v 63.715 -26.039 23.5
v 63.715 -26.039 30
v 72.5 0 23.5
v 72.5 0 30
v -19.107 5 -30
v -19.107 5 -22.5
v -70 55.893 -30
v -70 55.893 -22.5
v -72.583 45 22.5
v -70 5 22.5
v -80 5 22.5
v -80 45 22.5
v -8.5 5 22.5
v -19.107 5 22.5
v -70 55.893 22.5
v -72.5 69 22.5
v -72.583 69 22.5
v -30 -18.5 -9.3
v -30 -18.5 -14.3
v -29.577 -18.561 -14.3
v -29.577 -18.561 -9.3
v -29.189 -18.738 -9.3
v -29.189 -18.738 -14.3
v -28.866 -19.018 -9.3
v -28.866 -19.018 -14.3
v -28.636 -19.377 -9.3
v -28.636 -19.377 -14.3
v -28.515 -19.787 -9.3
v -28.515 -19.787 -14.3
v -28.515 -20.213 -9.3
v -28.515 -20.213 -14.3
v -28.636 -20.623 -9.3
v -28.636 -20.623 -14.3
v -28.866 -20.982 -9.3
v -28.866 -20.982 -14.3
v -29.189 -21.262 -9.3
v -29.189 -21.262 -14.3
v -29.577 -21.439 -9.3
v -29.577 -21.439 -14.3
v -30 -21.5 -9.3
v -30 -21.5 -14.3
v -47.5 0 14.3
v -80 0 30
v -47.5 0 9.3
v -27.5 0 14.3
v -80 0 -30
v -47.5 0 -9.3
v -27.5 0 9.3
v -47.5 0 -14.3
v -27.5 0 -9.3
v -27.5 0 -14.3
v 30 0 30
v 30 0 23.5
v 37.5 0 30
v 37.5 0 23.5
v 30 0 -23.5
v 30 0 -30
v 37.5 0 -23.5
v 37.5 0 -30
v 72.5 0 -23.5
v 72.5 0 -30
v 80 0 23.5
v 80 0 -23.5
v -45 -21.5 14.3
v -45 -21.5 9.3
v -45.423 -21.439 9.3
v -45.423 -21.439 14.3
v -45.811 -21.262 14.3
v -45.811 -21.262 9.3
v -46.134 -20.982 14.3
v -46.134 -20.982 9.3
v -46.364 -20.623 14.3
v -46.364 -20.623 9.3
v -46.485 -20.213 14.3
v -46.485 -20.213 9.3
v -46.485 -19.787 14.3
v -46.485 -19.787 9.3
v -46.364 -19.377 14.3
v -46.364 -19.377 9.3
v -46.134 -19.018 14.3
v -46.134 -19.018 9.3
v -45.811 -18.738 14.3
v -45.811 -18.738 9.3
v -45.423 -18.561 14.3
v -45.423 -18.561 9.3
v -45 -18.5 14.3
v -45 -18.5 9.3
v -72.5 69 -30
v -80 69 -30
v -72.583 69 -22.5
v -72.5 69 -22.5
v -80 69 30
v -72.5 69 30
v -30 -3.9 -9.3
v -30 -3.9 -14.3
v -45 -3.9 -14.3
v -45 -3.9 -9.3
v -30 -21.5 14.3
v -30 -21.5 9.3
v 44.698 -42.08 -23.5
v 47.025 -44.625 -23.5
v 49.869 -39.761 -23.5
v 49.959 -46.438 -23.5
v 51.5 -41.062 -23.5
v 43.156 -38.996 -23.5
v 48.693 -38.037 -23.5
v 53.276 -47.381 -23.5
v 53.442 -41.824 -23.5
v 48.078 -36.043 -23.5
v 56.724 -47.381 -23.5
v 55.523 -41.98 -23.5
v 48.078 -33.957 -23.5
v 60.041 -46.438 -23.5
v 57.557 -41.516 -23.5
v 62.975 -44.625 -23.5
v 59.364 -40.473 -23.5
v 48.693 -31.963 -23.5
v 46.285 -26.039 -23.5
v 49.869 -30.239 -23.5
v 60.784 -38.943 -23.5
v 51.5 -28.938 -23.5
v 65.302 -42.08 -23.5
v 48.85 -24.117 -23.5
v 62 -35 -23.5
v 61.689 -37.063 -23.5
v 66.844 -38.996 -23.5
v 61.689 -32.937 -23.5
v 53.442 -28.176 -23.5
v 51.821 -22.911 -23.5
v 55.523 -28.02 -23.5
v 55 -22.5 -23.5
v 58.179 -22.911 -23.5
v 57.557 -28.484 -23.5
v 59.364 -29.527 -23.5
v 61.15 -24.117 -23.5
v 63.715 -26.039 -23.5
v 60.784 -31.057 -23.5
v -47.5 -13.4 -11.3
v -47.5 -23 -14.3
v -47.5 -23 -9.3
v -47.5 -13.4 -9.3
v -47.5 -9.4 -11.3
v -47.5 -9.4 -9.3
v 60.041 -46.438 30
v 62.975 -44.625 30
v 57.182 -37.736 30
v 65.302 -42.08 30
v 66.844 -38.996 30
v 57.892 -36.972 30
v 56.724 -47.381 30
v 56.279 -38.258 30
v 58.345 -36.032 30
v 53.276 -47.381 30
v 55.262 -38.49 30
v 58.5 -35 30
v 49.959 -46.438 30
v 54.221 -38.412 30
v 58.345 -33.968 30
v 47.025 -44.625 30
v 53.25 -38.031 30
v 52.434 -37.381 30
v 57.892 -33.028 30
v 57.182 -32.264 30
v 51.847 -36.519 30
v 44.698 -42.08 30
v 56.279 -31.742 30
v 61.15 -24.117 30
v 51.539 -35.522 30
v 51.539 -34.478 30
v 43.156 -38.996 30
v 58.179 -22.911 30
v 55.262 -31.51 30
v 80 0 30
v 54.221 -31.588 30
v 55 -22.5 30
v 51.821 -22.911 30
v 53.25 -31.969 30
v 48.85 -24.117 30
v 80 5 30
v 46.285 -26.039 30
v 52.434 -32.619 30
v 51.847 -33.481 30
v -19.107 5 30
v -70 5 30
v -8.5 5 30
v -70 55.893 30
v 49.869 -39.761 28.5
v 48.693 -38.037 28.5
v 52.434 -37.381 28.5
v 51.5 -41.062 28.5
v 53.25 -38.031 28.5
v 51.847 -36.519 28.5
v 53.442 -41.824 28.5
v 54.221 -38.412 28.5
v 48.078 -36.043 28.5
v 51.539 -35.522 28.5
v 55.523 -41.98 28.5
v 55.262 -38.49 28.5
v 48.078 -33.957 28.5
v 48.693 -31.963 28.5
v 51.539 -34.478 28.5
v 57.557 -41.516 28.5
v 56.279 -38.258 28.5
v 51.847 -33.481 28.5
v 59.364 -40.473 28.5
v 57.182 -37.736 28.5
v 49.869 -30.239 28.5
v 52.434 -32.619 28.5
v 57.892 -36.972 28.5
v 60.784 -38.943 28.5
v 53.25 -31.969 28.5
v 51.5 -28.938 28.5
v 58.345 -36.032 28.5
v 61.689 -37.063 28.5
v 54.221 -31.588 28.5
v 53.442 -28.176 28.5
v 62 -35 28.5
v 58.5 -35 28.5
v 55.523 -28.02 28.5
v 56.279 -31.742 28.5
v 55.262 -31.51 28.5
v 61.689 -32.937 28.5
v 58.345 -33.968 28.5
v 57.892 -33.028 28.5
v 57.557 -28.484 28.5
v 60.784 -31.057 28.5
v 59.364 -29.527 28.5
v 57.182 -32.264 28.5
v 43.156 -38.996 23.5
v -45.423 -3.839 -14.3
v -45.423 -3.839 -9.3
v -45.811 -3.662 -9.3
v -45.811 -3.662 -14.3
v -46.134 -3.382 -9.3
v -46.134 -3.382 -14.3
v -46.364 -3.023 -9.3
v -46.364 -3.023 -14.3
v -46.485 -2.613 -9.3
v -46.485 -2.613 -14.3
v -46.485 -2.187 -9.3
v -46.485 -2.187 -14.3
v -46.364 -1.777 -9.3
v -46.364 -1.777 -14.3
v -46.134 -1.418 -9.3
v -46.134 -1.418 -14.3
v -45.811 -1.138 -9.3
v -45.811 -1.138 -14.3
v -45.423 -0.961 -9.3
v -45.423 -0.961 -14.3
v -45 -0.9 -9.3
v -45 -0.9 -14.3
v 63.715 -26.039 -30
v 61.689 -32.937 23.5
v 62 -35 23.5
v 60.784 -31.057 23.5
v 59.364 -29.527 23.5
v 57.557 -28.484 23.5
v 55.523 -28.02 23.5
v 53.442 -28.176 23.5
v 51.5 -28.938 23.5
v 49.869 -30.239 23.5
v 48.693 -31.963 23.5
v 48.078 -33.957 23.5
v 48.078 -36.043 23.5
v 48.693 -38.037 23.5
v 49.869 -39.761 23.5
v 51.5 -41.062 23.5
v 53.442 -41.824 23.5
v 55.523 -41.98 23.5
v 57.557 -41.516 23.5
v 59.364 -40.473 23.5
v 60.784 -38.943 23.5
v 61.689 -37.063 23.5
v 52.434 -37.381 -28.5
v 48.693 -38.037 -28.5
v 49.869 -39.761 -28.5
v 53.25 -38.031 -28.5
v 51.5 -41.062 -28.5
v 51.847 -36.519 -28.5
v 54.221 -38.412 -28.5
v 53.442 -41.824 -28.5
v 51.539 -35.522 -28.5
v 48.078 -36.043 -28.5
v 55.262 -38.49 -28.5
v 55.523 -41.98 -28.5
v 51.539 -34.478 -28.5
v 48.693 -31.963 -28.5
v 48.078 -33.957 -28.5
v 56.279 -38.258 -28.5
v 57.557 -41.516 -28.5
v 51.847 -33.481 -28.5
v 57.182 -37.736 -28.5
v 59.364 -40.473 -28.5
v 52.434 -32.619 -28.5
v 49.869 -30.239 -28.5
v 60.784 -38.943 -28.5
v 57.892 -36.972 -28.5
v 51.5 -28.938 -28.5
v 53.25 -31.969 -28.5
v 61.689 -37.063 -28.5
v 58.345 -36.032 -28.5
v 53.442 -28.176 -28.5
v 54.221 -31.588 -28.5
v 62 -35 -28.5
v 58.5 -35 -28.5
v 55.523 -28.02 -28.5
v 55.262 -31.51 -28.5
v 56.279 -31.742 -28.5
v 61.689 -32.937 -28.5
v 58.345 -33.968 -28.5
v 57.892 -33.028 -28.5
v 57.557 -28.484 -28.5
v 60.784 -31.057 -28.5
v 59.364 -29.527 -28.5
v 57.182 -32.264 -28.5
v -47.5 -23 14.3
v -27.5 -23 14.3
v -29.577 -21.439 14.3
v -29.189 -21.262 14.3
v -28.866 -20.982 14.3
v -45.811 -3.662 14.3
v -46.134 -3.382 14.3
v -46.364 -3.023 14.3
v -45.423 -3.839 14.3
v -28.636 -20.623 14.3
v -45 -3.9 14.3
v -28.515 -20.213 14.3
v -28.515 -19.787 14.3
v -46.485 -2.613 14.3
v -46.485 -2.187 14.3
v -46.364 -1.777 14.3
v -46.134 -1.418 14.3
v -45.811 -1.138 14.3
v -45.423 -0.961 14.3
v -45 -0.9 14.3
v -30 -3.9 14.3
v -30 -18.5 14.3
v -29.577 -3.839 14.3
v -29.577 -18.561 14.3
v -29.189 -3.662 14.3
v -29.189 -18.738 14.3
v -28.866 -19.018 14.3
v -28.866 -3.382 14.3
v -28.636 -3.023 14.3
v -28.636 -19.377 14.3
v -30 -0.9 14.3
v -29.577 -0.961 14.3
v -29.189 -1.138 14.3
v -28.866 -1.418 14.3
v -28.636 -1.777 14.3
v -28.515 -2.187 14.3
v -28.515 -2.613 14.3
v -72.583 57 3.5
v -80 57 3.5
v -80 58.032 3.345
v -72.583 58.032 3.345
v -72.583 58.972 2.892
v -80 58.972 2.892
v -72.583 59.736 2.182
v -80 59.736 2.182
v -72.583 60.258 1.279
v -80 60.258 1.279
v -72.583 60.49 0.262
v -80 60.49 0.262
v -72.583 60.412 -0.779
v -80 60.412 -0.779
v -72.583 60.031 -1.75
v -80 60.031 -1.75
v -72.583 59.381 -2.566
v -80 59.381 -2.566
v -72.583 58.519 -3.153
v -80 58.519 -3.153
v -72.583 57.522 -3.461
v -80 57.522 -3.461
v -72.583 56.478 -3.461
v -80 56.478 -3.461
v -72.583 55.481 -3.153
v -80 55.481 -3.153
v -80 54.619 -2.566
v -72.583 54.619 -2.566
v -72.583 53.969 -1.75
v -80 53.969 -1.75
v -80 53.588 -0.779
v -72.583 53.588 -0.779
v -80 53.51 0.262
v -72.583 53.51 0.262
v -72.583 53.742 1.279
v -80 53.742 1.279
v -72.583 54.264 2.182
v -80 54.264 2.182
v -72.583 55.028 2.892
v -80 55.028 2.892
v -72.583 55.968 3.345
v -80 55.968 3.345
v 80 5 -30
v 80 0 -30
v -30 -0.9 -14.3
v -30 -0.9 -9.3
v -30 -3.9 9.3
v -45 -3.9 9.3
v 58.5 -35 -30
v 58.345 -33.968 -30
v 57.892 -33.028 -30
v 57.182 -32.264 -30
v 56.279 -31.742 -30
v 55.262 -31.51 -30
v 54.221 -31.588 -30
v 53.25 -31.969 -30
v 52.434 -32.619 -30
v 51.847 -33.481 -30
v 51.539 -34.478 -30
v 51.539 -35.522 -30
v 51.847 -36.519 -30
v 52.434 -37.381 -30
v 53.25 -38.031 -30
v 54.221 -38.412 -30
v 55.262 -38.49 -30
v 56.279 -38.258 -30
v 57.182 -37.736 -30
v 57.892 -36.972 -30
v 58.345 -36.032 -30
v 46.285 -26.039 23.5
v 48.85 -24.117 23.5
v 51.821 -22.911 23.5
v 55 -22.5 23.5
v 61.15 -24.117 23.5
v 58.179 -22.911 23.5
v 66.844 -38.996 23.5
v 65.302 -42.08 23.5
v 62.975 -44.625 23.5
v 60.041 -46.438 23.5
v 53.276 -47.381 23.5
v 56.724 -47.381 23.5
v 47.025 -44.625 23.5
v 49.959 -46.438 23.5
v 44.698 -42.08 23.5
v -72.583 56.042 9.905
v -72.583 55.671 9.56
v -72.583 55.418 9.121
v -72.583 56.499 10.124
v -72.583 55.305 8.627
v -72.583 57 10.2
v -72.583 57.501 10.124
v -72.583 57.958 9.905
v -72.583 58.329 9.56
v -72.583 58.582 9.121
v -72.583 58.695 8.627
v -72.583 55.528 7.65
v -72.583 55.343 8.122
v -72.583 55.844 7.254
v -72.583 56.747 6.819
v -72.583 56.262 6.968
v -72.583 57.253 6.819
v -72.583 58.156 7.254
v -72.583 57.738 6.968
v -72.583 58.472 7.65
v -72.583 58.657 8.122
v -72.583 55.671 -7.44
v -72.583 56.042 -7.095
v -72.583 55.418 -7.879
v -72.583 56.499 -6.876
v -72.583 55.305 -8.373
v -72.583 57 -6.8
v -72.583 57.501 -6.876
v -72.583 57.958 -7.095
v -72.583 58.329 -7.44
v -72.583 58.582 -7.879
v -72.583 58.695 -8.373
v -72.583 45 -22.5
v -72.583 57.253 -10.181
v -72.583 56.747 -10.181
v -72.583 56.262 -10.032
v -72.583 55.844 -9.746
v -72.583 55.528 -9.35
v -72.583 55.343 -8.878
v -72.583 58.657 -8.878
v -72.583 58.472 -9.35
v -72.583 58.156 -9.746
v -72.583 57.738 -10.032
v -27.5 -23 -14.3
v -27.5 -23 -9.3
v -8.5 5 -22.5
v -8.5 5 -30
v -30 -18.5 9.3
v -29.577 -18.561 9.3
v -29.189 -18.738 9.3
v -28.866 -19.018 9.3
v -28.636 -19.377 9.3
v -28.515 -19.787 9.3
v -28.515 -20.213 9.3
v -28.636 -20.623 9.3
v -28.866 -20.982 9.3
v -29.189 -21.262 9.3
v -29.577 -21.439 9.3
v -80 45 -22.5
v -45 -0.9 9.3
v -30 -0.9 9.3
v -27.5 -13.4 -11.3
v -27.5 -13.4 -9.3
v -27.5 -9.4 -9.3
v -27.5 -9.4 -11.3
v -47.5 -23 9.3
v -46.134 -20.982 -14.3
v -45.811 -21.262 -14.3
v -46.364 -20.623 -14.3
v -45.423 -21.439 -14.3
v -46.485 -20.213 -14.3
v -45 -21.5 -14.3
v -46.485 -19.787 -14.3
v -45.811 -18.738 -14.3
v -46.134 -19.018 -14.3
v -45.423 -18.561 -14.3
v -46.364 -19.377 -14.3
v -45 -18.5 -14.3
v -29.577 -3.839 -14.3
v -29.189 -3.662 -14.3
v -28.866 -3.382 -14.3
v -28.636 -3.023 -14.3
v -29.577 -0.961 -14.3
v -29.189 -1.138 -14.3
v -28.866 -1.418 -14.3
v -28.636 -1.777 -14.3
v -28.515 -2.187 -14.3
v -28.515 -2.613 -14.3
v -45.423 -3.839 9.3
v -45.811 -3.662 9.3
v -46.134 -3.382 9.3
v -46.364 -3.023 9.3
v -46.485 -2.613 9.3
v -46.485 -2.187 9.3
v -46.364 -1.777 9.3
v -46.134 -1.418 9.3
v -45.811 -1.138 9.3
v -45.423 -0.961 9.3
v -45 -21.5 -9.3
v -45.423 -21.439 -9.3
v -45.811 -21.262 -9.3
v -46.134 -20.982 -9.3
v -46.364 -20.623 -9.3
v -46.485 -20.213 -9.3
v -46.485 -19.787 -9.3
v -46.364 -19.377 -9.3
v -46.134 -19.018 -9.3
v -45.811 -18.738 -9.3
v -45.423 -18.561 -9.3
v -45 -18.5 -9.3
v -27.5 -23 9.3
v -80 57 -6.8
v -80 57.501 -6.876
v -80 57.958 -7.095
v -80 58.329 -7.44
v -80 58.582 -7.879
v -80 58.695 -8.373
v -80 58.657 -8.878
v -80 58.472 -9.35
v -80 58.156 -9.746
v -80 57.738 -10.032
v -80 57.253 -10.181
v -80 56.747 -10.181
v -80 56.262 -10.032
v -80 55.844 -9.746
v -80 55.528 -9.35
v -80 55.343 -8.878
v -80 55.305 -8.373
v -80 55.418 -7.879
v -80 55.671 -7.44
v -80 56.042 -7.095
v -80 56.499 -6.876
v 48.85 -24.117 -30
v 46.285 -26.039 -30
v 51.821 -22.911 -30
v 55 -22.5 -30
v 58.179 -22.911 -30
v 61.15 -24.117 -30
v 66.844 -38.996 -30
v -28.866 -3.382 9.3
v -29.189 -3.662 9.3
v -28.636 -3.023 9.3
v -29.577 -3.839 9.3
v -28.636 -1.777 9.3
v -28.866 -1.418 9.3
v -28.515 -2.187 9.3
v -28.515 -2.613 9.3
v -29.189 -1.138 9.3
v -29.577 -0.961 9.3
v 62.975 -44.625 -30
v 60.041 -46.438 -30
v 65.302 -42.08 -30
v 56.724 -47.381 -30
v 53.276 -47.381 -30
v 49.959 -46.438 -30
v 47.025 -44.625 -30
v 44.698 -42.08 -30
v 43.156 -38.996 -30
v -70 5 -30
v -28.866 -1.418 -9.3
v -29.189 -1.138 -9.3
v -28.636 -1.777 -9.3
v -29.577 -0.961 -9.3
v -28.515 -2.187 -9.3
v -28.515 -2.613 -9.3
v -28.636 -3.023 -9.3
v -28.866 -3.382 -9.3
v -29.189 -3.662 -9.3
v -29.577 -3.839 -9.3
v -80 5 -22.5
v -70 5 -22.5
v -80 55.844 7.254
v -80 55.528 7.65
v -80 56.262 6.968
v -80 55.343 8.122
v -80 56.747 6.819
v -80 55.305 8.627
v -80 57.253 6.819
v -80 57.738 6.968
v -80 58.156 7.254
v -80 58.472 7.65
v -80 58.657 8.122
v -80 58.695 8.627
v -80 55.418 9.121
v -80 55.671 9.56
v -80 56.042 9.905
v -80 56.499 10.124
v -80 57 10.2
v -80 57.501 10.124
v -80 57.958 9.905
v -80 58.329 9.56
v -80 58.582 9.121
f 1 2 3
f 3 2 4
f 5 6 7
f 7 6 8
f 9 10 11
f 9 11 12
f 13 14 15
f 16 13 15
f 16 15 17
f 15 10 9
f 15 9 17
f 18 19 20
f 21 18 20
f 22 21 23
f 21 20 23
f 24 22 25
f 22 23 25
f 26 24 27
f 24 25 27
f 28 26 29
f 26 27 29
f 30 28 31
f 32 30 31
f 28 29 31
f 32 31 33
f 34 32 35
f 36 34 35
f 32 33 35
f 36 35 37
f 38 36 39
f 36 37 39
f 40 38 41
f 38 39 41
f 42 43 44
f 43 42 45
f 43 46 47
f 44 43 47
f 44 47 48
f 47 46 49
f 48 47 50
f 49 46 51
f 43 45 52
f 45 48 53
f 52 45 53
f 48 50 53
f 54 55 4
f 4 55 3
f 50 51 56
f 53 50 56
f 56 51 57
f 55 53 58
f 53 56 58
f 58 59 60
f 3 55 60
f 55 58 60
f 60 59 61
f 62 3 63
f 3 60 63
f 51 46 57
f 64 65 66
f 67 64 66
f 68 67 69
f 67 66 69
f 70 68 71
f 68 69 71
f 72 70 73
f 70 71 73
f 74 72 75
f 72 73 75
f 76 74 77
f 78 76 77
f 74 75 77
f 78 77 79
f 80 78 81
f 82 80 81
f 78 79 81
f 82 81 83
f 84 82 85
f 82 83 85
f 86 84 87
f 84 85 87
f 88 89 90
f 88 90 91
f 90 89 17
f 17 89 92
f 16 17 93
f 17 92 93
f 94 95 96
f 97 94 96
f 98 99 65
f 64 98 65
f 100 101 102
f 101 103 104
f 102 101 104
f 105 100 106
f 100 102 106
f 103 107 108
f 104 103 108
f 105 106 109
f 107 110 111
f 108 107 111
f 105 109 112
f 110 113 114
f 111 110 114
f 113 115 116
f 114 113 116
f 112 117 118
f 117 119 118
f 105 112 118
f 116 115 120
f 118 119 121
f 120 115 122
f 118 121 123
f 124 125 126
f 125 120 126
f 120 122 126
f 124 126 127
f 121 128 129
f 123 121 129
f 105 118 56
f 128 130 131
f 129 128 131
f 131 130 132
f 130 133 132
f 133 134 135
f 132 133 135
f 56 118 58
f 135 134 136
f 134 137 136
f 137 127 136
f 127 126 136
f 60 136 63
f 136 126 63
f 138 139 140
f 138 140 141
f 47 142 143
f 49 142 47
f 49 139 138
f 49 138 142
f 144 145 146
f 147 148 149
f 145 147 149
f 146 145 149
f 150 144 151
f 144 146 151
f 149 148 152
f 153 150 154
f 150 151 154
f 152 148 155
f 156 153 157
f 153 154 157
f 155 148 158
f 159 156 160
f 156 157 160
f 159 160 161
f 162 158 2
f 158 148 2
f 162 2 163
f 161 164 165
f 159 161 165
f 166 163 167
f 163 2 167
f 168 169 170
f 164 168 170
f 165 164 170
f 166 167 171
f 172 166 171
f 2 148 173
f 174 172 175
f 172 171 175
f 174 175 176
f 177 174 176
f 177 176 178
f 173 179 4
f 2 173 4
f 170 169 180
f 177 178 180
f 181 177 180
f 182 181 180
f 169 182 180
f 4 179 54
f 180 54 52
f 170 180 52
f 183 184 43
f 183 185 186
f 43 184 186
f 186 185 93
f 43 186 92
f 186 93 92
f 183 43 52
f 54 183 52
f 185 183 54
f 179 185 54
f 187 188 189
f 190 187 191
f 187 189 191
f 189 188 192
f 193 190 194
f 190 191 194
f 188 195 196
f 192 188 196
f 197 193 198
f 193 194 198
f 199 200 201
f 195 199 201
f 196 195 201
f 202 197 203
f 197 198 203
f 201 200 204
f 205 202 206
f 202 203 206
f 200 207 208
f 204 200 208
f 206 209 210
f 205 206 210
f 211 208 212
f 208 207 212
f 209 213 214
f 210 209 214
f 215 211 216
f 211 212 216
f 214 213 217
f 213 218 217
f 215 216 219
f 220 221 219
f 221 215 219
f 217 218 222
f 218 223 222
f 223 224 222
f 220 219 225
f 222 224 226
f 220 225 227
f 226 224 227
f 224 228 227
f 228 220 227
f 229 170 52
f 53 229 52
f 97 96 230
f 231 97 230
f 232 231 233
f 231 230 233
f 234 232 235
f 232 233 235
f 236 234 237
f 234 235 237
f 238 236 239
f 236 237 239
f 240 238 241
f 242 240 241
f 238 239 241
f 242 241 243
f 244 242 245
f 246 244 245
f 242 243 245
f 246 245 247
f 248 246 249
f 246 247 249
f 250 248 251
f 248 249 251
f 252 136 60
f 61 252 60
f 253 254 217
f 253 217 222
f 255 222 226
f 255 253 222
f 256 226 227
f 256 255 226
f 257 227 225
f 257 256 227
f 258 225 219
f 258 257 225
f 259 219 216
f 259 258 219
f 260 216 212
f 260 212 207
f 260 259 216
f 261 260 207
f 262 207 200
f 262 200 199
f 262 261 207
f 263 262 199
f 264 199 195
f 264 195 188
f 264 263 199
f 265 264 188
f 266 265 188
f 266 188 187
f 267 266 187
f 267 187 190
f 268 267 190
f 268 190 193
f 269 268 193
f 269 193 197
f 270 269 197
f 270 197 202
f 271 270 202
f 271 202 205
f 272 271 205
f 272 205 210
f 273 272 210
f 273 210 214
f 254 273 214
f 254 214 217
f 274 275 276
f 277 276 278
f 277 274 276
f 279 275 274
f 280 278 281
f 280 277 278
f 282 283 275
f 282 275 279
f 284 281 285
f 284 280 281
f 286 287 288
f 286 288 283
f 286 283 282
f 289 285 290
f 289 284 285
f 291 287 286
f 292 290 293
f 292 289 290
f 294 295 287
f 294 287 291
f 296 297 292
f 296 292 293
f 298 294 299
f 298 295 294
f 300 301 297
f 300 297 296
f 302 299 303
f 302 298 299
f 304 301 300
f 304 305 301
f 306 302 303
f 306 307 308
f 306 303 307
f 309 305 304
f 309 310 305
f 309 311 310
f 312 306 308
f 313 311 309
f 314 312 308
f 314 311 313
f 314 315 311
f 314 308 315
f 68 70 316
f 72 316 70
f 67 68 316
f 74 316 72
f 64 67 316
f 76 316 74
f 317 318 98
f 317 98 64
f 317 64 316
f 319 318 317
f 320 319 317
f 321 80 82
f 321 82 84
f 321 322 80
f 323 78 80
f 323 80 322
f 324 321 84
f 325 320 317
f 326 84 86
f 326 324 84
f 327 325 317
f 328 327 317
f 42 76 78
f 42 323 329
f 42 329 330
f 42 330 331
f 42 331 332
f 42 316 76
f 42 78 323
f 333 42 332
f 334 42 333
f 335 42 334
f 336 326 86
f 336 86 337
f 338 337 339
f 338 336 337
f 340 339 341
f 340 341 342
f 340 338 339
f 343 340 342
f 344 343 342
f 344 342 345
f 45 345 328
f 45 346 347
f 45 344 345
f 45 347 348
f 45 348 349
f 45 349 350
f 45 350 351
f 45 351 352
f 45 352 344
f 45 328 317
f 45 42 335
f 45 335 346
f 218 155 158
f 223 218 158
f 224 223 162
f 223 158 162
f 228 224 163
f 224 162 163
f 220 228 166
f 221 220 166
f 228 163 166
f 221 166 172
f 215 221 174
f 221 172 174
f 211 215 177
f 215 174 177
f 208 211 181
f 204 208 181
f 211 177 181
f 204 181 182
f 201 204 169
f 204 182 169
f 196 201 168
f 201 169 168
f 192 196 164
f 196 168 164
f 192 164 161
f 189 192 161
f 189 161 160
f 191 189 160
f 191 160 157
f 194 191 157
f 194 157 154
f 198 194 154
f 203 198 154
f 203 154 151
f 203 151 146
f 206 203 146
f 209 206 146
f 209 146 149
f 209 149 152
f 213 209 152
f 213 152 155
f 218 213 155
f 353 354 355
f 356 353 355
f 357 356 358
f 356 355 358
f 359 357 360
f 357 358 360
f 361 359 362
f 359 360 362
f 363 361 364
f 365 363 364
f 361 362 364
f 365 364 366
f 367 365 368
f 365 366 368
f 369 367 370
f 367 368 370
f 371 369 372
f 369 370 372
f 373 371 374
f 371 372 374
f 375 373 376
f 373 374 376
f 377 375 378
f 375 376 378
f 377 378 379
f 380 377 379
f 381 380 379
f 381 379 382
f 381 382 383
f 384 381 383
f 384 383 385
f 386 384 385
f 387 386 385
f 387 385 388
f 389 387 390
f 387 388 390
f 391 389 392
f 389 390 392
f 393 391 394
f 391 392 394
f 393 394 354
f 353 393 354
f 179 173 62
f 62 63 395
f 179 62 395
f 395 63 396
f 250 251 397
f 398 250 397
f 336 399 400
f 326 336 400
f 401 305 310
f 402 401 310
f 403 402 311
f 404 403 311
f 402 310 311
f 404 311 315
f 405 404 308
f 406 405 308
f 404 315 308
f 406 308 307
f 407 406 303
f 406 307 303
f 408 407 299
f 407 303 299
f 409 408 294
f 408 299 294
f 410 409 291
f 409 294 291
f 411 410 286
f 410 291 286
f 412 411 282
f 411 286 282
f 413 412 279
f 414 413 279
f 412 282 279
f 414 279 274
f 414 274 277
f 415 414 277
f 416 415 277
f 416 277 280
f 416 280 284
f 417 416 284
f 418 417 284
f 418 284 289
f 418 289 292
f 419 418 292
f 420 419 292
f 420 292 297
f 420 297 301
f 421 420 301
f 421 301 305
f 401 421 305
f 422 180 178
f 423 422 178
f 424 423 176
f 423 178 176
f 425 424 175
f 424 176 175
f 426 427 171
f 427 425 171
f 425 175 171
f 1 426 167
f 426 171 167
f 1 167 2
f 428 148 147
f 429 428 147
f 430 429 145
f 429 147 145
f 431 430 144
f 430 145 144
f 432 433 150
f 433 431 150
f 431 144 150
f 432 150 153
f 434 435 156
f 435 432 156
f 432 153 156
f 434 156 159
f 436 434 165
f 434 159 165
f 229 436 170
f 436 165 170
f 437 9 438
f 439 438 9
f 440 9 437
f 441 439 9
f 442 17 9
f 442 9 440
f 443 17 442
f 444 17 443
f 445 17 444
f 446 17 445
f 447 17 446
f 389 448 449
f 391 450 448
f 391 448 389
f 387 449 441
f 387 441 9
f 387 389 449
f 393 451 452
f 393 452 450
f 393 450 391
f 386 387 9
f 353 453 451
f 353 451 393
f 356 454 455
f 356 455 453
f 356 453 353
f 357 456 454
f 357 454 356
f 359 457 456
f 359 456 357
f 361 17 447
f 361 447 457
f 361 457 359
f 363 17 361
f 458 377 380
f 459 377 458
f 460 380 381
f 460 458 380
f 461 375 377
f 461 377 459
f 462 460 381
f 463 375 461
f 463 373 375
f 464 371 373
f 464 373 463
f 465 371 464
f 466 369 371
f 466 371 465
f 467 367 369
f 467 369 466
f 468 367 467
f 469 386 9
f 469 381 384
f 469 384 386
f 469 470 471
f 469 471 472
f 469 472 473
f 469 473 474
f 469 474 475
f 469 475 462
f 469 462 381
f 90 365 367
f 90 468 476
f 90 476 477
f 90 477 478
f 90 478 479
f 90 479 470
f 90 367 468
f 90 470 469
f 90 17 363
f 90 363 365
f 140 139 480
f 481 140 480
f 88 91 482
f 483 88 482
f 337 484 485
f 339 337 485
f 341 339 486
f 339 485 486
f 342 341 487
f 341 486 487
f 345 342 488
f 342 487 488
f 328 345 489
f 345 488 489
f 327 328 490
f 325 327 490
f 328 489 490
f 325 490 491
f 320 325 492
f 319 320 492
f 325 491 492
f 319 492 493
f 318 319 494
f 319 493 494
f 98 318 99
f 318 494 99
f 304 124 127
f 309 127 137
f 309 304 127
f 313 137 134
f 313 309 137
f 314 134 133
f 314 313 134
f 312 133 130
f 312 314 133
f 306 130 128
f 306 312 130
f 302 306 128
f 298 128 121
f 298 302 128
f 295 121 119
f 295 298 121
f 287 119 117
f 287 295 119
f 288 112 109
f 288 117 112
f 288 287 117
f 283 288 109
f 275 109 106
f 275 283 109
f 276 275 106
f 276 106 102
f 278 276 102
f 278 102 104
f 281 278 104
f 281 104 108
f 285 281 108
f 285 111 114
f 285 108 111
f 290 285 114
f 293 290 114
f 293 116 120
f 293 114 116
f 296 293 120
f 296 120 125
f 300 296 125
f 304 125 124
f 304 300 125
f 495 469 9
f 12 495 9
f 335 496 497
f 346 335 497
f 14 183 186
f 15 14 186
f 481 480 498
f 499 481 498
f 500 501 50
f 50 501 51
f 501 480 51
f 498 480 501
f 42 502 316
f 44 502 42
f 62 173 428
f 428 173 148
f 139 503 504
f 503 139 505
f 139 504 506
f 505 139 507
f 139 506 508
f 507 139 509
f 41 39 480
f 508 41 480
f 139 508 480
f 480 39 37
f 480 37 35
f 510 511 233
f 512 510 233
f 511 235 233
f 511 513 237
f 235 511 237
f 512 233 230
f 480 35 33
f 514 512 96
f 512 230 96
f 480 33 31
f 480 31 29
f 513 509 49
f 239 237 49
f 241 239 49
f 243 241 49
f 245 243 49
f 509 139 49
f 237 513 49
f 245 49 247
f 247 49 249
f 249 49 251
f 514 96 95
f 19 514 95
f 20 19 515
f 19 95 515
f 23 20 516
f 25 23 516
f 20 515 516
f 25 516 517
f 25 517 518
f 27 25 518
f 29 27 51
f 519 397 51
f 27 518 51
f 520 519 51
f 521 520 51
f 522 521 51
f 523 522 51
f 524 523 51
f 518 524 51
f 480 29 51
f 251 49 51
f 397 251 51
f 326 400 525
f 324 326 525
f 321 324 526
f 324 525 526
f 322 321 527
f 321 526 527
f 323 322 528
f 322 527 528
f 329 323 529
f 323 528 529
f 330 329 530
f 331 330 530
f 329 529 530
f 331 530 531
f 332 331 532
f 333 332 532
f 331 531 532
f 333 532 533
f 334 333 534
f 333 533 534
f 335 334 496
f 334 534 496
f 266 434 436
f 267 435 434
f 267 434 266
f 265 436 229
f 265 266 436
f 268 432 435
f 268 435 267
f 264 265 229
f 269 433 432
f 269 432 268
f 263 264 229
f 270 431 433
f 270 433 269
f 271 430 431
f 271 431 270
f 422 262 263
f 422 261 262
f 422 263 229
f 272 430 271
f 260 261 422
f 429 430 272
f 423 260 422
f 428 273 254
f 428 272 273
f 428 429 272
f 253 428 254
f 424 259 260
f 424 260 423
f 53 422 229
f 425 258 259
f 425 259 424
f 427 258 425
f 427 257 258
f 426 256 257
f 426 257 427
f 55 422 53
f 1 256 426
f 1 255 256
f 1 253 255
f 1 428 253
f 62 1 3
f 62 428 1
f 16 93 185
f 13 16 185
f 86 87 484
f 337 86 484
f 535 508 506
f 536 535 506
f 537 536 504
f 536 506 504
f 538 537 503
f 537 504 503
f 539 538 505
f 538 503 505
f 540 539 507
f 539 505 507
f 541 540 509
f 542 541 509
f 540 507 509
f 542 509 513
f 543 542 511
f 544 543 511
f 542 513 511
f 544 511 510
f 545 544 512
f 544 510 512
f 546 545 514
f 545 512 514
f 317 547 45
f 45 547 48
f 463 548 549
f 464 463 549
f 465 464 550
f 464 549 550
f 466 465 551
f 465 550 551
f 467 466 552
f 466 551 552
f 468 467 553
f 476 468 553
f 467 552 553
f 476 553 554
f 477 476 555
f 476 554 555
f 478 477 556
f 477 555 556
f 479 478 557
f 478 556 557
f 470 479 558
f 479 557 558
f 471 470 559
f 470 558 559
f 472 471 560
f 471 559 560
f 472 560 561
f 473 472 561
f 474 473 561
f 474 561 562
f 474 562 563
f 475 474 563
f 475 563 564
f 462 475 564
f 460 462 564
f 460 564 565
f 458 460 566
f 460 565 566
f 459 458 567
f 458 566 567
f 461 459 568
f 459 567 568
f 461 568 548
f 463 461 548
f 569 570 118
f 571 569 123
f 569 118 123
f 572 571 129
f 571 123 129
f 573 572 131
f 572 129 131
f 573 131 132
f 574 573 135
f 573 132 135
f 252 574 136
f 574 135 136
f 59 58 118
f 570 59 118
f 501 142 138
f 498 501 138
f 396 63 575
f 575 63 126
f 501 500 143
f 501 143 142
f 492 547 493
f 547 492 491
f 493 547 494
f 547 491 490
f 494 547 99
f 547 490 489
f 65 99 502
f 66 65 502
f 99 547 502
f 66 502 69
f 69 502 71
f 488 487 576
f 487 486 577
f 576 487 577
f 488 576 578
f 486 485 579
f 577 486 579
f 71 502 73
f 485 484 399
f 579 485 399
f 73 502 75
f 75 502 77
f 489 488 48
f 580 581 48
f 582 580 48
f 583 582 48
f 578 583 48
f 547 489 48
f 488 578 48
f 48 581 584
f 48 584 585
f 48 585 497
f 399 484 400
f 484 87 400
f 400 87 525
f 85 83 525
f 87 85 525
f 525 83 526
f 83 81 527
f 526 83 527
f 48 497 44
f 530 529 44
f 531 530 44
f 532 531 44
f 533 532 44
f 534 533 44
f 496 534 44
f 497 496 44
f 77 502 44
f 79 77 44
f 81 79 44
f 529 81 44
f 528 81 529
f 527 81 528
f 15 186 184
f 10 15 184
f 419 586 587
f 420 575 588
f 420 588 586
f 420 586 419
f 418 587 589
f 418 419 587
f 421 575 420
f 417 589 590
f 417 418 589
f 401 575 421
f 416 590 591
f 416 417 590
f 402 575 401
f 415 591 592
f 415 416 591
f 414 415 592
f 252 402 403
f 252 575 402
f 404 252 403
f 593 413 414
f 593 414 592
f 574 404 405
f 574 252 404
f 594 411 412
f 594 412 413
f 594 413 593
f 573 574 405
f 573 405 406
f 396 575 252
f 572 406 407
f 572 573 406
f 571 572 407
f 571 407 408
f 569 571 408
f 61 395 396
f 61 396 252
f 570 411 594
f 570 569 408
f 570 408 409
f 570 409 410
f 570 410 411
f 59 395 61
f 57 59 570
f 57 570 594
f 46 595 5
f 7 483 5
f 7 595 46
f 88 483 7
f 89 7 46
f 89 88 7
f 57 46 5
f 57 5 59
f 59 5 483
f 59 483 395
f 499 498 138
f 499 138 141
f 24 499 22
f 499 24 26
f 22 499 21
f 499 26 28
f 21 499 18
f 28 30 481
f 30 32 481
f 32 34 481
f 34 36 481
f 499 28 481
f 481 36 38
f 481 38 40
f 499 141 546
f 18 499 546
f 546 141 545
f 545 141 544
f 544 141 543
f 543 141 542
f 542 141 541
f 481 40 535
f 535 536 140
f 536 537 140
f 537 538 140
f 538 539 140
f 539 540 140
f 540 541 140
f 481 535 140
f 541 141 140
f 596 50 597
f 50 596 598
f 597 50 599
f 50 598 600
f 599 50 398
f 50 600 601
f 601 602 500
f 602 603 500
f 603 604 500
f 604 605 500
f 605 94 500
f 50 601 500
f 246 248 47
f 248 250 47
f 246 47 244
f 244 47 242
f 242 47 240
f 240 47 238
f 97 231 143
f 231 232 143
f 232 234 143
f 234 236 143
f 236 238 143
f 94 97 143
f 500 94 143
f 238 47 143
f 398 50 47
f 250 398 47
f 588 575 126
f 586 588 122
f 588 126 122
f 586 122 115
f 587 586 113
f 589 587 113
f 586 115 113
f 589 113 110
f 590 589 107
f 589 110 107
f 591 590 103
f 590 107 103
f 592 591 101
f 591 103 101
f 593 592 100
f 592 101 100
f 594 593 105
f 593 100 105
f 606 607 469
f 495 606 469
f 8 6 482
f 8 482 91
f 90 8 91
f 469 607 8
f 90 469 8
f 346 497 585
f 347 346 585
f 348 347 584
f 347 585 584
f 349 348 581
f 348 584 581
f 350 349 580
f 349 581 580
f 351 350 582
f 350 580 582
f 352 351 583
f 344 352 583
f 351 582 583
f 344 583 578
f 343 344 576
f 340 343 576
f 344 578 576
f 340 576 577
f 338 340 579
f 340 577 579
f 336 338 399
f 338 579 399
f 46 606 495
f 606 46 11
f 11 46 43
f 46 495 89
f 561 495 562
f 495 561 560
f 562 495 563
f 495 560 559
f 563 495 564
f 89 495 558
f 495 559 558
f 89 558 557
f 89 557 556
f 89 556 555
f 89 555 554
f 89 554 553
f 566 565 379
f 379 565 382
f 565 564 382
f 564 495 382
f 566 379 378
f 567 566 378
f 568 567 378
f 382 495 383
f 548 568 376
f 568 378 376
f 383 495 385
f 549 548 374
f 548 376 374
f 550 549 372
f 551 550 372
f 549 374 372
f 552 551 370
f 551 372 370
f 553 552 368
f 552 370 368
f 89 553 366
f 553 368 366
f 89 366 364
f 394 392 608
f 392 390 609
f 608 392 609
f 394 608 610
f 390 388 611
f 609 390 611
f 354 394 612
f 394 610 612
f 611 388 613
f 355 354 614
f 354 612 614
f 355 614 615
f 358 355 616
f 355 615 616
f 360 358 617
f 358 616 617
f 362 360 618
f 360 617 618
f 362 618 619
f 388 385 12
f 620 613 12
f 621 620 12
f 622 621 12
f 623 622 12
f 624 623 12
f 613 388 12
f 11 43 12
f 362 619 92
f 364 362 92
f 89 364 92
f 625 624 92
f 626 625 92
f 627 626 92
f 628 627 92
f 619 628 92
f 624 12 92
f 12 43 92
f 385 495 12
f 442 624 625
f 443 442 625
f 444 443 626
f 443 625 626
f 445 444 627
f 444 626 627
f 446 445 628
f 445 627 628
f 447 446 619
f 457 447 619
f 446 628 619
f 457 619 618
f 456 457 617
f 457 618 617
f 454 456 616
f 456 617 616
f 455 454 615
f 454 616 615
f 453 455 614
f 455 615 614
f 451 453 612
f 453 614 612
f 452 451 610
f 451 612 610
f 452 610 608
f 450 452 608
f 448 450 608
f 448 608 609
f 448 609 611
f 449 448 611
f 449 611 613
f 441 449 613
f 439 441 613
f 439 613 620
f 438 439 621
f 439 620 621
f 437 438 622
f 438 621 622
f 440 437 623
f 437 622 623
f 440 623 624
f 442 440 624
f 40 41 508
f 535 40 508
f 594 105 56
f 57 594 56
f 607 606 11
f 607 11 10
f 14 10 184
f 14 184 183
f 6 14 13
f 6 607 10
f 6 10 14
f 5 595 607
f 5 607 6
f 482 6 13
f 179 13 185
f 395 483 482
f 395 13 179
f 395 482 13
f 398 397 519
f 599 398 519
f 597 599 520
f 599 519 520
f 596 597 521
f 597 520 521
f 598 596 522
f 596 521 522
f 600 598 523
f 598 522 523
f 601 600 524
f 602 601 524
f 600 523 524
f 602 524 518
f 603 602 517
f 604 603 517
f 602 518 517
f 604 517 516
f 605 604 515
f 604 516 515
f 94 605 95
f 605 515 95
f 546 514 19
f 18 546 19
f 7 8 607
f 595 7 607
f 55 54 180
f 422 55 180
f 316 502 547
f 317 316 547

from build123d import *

# Parameters (mm, degrees)
SKETCH1_W                = 160
SKETCH1_H                = 60
BOSS_EXTRUDE1_DEPTH      = 5
BOSS_EXTRUDE3_DEPTH      = 14.3
BOSS_EXTRUDE3_DEPTH_BACK = 14.3
SKETCH8_W                = 20
SKETCH8_H                = 23
CUT_EXTRUDE1_REACH       = 134.986
BOSS_EXTRUDE4_DEPTH      = 60
CUT_EXTRUDE2_START       = -71.5
SKETCH11_W               = 45
SKETCH11_H               = 40
CUT_EXTRUDE2_DEPTH       = 71.5
SKETCH12_W               = 24.082620142
SKETCH12_H               = 45
CUT_EXTRUDE3_DEPTH       = 24
SKETCH13_R               = 3.5
SKETCH13_R_2             = 1.7
CUT_EXTRUDE4_DEPTH       = 7.417379858
SKETCH14_R               = 3.5
BOSS_EXTRUDE5_DEPTH      = 60
SKETCH16_W               = 47
SKETCH16_H               = 47.898935067
CUT_EXTRUDE6_DEPTH       = 107.5
CUT_EXTRUDE7_DEPTH       = 28.5
CUT_EXTRUDE7_DEPTH_BACK  = 28.5
SKETCH17_R               = 7


with BuildPart() as part:
    # Sketch1 → Boss-Extrude1 (new body)
    with BuildSketch(Plane(origin=(0, 0, 0), x_dir=(1, 0, 0), z_dir=(0, 1, 0))):
        Rectangle(SKETCH1_W, SKETCH1_H)
    extrude(amount=BOSS_EXTRUDE1_DEPTH)

    # Sketch8 → Boss-Extrude3 (add, two sides: drawn at the far end of the back side and taken through both)
    with BuildSketch(Plane.XY.offset(-BOSS_EXTRUDE3_DEPTH_BACK)):
        with Locations((-37.5, -11.5)):
            Rectangle(SKETCH8_W, SKETCH8_H)
        with BuildLine():
            Line((-45, -18.5), (-30, -18.5))
            ThreePointArc((-30, -18.5), (-28.5, -20), (-30, -21.5))
            Line((-30, -21.5), (-45, -21.5))
            ThreePointArc((-45, -21.5), (-46.5, -20), (-45, -18.5))
        make_face(mode=Mode.SUBTRACT)
        with BuildLine():
            Line((-45, -0.9), (-30, -0.9))
            ThreePointArc((-30, -0.9), (-28.5, -2.4), (-30, -3.9))
            Line((-30, -3.9), (-45, -3.9))
            ThreePointArc((-45, -3.9), (-46.5, -2.4), (-45, -0.9))
        make_face(mode=Mode.SUBTRACT)
    extrude(amount=BOSS_EXTRUDE3_DEPTH + BOSS_EXTRUDE3_DEPTH_BACK)

    # Cut-Extrude1: up to this face of the body (flat: up to its plane)
    cut_extrude1_end = Plane(part.part.faces().sort_by_distance((-27.5, -11.5, 0))[0])
    # Sketch9 → Cut-Extrude1 (cut, up to the picked face)
    with BuildSketch(Plane.ZY.offset(47.5), mode=Mode.PRIVATE) as cut_extrude1_sk1:
        Polygon((-9.3, -23), (9.3, -23), (9.3, 0), (-9.3, 0), (-9.3, -9.4), (-11.3, -9.4), (-11.3, -13.4), (-9.3, -13.4), align=None)
    cut_extrude1_tool1 = split(extrude(cut_extrude1_sk1.sketch, amount=-CUT_EXTRUDE1_REACH, mode=Mode.PRIVATE), bisect_by=cut_extrude1_end, keep=Keep.BOTH, mode=Mode.PRIVATE)
    add(cut_extrude1_tool1.solids().sort_by(Axis((-47.5, -11.498164, -0.189078), (1, 0, 0)))[0], mode=Mode.SUBTRACT)

    # Sketch10 → Boss-Extrude4 (add)
    with BuildSketch(Plane.XY.offset(30)):
        Polygon((-72.5, 69), (-8.5, 5), (-19.106601718, 5), (-70, 55.893398282), (-70, 5), (-72.5, 5), (-80, 5), (-80, 69), align=None)
    extrude(amount=-BOSS_EXTRUDE4_DEPTH)

    # Sketch11 → Cut-Extrude2 (cut)
    with BuildSketch(Plane.ZY.offset(80).offset(CUT_EXTRUDE2_START)):
        with Locations((0, 25)):
            Rectangle(SKETCH11_W, SKETCH11_H)
    extrude(amount=CUT_EXTRUDE2_DEPTH, mode=Mode.SUBTRACT)

    # Sketch12 → Cut-Extrude3 (cut)
    with BuildSketch(Plane(origin=(0, 69, 0), x_dir=(1, 0, 0), z_dir=(0, 1, 0))):
        with Locations((-60.541310071, 0)):
            Rectangle(SKETCH12_W, SKETCH12_H)
    extrude(amount=-CUT_EXTRUDE3_DEPTH, mode=Mode.SUBTRACT)

    # Sketch13 → Cut-Extrude4 (cut)
    with BuildSketch(Plane.ZY.offset(80)):
        with Locations((0, 57)):
            Circle(SKETCH13_R)
        with Locations((-8.5, 57)):
            Circle(SKETCH13_R_2)
        with Locations((8.5, 57)):
            Circle(SKETCH13_R_2)
    extrude(amount=-CUT_EXTRUDE4_DEPTH, mode=Mode.SUBTRACT)

    # Sketch14 → Boss-Extrude5 (add)
    with BuildSketch(Plane.XY.offset(30)):
        with BuildLine():
            Line((80, 0), (66.844135363, -38.995809861))
            ThreePointArc((66.844135363, -38.995809861), (55, -47.500001557), (43.155864637, -38.995809861))
            Line((43.155864637, -38.995809861), (30, 0))
            Line((30, 0), (37.5, 0))
            Line((37.5, 0), (46.28476615, -26.03926689))
            ThreePointArc((46.28476615, -26.03926689), (55, -22.499998443), (63.71523385, -26.03926689))
            Line((63.71523385, -26.03926689), (72.5, 0))
            Line((72.5, 0), (80, 0))
        make_face()
        with Locations((55, -35)):
            Circle(SKETCH14_R, mode=Mode.SUBTRACT)
    extrude(amount=-BOSS_EXTRUDE5_DEPTH)

    # Sketch16 → Cut-Extrude6 (cut)
    with BuildSketch(Plane(origin=(80, 0, 0), x_dir=(0, 0, -1), z_dir=(1, 0, 0))):
        with Locations((0, -23.949467534)):
            Rectangle(SKETCH16_W, SKETCH16_H)
    extrude(amount=-CUT_EXTRUDE6_DEPTH, mode=Mode.SUBTRACT)

    # Sketch17 → Cut-Extrude7 (cut, two sides: drawn at the far end of the back side and taken through both)
    with BuildSketch(Plane.XY.offset(-CUT_EXTRUDE7_DEPTH_BACK)):
        with Locations((55, -35)):
            Circle(SKETCH17_R)
    extrude(amount=CUT_EXTRUDE7_DEPTH + CUT_EXTRUDE7_DEPTH_BACK, mode=Mode.SUBTRACT)


solid = part.part
